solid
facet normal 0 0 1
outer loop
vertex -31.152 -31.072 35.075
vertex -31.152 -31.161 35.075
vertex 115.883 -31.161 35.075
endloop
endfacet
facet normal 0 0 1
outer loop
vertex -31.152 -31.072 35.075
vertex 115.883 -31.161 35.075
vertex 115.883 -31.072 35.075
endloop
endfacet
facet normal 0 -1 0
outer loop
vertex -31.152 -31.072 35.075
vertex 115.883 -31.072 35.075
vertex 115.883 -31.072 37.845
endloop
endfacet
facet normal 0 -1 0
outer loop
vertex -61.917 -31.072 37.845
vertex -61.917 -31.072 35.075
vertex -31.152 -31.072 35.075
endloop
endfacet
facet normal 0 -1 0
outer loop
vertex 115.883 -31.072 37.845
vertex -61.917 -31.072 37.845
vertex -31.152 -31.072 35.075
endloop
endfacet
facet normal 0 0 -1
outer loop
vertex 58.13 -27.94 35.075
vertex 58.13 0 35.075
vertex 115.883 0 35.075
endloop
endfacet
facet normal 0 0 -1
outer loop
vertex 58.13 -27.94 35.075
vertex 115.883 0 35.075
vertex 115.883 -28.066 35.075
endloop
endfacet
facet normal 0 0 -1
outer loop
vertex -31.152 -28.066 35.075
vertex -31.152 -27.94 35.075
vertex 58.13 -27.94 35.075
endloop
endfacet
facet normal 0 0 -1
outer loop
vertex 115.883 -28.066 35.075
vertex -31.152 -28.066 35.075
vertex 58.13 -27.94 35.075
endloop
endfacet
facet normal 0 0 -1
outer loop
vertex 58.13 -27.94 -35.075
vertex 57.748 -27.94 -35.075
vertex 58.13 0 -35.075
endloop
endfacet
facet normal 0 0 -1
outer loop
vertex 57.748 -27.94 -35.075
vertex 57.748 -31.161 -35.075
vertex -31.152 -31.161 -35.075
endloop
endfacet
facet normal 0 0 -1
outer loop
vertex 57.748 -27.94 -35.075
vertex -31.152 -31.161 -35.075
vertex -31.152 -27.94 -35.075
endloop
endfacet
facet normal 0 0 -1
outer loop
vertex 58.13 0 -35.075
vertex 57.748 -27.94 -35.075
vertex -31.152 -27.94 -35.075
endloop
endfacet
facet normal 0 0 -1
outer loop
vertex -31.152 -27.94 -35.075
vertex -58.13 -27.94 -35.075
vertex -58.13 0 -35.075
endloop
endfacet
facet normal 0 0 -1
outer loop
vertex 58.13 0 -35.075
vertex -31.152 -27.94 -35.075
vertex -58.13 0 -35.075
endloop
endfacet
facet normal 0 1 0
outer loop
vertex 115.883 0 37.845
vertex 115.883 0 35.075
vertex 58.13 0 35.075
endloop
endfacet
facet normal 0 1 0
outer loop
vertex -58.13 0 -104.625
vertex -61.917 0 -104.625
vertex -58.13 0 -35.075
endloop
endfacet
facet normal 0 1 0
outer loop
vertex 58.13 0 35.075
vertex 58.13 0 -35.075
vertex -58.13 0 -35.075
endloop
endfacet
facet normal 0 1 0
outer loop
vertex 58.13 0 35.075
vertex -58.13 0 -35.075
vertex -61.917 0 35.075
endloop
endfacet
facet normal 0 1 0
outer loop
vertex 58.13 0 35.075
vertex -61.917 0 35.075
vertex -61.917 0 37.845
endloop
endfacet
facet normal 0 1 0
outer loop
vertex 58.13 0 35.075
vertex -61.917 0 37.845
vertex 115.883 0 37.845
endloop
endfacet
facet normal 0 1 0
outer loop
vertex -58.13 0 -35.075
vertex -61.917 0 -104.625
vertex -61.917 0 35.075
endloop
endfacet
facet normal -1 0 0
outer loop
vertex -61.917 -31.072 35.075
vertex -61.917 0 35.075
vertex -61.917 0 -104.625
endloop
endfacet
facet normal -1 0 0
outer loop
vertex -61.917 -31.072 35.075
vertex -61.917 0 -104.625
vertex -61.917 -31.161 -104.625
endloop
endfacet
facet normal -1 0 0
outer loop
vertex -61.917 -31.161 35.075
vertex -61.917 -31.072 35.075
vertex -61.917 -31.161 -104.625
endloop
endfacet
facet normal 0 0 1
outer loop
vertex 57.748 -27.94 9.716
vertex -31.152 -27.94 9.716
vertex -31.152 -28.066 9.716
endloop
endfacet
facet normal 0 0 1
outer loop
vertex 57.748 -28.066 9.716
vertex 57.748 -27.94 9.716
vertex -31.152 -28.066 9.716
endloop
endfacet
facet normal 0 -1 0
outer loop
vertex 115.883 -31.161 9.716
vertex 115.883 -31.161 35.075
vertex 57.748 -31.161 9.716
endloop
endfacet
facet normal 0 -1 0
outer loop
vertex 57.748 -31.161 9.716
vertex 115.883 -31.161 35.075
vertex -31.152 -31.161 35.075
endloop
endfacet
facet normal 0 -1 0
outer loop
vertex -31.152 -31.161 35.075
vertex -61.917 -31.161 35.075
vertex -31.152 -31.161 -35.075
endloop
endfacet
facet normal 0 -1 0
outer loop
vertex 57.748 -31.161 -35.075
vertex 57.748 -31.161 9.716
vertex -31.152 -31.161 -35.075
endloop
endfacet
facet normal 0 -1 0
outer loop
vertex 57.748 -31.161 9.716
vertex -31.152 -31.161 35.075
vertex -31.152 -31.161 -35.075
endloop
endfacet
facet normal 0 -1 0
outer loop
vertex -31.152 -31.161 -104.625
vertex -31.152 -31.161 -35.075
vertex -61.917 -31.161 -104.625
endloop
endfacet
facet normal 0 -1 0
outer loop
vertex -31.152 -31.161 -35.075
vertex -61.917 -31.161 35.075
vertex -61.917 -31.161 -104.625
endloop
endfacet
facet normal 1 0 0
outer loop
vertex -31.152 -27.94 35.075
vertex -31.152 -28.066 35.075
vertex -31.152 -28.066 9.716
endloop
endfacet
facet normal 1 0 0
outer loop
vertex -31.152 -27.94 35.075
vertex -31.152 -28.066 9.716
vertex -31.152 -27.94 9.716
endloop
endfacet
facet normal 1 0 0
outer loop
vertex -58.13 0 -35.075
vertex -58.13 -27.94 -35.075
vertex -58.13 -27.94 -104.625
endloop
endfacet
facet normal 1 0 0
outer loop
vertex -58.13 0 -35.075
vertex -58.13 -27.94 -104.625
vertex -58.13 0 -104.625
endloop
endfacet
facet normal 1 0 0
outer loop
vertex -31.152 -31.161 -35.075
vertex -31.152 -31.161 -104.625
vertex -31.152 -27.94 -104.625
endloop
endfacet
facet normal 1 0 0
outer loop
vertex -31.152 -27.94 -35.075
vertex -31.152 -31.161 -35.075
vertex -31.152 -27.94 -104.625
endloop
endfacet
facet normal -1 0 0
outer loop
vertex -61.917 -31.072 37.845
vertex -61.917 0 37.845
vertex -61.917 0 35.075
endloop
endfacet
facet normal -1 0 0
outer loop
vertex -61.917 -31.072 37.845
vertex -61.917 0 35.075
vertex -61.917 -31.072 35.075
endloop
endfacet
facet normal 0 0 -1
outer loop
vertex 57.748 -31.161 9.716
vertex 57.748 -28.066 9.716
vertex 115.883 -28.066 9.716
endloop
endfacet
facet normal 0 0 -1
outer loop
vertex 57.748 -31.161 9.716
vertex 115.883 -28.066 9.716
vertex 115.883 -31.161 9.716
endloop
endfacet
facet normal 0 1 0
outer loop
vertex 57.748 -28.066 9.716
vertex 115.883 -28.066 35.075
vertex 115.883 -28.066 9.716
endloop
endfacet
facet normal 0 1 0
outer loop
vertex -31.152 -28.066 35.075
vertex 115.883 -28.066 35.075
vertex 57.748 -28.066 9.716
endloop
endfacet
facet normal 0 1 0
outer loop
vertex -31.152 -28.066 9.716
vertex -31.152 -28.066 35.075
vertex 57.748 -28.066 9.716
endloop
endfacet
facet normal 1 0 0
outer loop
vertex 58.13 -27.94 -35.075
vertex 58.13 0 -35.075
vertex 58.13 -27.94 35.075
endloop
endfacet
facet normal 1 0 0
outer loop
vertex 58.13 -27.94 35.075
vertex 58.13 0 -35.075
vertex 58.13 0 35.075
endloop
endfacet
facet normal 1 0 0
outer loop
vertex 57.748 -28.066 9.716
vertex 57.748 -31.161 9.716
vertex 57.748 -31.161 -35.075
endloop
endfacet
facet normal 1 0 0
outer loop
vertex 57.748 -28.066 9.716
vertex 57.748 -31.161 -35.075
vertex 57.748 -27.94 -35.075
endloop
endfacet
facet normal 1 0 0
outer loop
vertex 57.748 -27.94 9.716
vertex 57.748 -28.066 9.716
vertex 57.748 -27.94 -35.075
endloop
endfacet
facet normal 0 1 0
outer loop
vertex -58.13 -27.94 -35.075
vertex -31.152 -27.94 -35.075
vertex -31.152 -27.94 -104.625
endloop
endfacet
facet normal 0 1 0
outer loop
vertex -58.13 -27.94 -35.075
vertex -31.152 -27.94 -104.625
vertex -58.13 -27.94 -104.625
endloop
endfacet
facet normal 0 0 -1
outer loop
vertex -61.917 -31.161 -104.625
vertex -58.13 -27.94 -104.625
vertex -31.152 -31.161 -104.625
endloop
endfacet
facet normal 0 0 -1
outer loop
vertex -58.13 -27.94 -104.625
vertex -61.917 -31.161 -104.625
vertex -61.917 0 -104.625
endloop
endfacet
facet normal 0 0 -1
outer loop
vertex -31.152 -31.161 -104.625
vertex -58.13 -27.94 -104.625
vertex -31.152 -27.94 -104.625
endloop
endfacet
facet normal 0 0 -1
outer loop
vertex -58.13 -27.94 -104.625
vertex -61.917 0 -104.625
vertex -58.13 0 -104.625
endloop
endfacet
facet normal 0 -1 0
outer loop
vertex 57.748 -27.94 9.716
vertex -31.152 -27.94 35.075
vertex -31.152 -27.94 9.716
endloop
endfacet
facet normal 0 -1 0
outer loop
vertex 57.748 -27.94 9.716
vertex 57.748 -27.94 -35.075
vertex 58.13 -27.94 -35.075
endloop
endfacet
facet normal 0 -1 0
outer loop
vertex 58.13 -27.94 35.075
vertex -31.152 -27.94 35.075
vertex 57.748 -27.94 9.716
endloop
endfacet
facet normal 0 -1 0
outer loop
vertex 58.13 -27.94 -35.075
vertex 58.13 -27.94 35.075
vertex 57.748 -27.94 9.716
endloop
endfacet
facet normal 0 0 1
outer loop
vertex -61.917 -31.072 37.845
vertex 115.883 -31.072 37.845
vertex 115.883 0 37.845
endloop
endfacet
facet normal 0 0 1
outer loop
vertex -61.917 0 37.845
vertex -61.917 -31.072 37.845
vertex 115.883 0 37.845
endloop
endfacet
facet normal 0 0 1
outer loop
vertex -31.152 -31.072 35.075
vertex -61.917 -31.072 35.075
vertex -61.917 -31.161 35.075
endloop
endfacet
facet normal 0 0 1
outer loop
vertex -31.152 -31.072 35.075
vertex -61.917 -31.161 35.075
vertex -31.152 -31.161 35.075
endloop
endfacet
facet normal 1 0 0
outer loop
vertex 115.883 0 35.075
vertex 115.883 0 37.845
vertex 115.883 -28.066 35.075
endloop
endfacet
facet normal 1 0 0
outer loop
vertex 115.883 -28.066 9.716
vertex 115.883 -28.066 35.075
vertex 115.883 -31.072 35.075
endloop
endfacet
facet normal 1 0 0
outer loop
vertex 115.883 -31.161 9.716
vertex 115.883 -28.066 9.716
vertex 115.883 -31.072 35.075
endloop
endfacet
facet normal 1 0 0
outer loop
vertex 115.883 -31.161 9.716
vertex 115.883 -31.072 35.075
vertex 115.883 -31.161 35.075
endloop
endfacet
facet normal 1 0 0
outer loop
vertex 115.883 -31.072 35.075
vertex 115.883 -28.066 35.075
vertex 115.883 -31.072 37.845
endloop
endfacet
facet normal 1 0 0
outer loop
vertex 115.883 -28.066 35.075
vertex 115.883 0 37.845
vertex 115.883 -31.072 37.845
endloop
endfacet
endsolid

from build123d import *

# Parameters (mm, degrees)
F0_W     = 116.2599772215
F0_H     = 70.1507925987
F1_DEPTH = 27.94
F2_W     = 3.7873648107
F2_H     = 27.94
F3_DEPTH = 139.7
F4_W     = 28.065841645
F4_H     = 2.7693584561
F4_W_2   = 3.0061341822
F5_DEPTH = 177.8
F7_DEPTH = 88.9


with BuildPart() as f1:
    # F0 (on Front) → F1 (new body)
    with BuildSketch(Plane.XZ):
        Rectangle(F0_W, F0_H)
    extrude(amount=F1_DEPTH)

    # F2 (on face) → F3 (join)
    with BuildSketch(Plane.XY.offset(35.0753962994)):
        with Locations((-60.0236710161, -13.97)):
            Rectangle(F2_W, F2_H)
        Polygon((-31.1518013477, -27.94), (-58.1299886107, -27.94), (-61.9173534214, -27.94), (-61.9173534214, -31.1609115452), (-31.1518013477, -31.1609115452), align=None)
    extrude(amount=-F3_DEPTH)

    # F4 (on face) → F5 (join)
    with BuildSketch(Plane(origin=(-61.9173534214, 0, 0), x_dir=(0, -1, 0), z_dir=(-1, 0, 0))):
        with Locations((14.0329208225, 36.4600755274)):
            Rectangle(F4_W, F4_H)
        Polygon((31.0719758272, 35.0753962994), (28.065841645, 35.0753962994), (28.065841645, 9.7159240395), (31.1609115452, 9.7159240395), (31.1609115452, 35.0753962994), align=None)
        with Locations((29.5689087361, 36.4600755274)):
            Rectangle(F4_W_2, F4_H)
    extrude(amount=-F5_DEPTH)

    # F6 (on face) → F7 (join)
    with BuildSketch(Plane.YZ.offset(-31.1518013477)):
        Polygon((-28.065841645, 9.7159240395), (-31.1609115452, 9.7159240395), (-31.1609115452, -35.0753962994), (-27.94, -35.0753962994), (-27.94, 9.7159240395), align=None)
    extrude(amount=F7_DEPTH)


solid = f1.part
